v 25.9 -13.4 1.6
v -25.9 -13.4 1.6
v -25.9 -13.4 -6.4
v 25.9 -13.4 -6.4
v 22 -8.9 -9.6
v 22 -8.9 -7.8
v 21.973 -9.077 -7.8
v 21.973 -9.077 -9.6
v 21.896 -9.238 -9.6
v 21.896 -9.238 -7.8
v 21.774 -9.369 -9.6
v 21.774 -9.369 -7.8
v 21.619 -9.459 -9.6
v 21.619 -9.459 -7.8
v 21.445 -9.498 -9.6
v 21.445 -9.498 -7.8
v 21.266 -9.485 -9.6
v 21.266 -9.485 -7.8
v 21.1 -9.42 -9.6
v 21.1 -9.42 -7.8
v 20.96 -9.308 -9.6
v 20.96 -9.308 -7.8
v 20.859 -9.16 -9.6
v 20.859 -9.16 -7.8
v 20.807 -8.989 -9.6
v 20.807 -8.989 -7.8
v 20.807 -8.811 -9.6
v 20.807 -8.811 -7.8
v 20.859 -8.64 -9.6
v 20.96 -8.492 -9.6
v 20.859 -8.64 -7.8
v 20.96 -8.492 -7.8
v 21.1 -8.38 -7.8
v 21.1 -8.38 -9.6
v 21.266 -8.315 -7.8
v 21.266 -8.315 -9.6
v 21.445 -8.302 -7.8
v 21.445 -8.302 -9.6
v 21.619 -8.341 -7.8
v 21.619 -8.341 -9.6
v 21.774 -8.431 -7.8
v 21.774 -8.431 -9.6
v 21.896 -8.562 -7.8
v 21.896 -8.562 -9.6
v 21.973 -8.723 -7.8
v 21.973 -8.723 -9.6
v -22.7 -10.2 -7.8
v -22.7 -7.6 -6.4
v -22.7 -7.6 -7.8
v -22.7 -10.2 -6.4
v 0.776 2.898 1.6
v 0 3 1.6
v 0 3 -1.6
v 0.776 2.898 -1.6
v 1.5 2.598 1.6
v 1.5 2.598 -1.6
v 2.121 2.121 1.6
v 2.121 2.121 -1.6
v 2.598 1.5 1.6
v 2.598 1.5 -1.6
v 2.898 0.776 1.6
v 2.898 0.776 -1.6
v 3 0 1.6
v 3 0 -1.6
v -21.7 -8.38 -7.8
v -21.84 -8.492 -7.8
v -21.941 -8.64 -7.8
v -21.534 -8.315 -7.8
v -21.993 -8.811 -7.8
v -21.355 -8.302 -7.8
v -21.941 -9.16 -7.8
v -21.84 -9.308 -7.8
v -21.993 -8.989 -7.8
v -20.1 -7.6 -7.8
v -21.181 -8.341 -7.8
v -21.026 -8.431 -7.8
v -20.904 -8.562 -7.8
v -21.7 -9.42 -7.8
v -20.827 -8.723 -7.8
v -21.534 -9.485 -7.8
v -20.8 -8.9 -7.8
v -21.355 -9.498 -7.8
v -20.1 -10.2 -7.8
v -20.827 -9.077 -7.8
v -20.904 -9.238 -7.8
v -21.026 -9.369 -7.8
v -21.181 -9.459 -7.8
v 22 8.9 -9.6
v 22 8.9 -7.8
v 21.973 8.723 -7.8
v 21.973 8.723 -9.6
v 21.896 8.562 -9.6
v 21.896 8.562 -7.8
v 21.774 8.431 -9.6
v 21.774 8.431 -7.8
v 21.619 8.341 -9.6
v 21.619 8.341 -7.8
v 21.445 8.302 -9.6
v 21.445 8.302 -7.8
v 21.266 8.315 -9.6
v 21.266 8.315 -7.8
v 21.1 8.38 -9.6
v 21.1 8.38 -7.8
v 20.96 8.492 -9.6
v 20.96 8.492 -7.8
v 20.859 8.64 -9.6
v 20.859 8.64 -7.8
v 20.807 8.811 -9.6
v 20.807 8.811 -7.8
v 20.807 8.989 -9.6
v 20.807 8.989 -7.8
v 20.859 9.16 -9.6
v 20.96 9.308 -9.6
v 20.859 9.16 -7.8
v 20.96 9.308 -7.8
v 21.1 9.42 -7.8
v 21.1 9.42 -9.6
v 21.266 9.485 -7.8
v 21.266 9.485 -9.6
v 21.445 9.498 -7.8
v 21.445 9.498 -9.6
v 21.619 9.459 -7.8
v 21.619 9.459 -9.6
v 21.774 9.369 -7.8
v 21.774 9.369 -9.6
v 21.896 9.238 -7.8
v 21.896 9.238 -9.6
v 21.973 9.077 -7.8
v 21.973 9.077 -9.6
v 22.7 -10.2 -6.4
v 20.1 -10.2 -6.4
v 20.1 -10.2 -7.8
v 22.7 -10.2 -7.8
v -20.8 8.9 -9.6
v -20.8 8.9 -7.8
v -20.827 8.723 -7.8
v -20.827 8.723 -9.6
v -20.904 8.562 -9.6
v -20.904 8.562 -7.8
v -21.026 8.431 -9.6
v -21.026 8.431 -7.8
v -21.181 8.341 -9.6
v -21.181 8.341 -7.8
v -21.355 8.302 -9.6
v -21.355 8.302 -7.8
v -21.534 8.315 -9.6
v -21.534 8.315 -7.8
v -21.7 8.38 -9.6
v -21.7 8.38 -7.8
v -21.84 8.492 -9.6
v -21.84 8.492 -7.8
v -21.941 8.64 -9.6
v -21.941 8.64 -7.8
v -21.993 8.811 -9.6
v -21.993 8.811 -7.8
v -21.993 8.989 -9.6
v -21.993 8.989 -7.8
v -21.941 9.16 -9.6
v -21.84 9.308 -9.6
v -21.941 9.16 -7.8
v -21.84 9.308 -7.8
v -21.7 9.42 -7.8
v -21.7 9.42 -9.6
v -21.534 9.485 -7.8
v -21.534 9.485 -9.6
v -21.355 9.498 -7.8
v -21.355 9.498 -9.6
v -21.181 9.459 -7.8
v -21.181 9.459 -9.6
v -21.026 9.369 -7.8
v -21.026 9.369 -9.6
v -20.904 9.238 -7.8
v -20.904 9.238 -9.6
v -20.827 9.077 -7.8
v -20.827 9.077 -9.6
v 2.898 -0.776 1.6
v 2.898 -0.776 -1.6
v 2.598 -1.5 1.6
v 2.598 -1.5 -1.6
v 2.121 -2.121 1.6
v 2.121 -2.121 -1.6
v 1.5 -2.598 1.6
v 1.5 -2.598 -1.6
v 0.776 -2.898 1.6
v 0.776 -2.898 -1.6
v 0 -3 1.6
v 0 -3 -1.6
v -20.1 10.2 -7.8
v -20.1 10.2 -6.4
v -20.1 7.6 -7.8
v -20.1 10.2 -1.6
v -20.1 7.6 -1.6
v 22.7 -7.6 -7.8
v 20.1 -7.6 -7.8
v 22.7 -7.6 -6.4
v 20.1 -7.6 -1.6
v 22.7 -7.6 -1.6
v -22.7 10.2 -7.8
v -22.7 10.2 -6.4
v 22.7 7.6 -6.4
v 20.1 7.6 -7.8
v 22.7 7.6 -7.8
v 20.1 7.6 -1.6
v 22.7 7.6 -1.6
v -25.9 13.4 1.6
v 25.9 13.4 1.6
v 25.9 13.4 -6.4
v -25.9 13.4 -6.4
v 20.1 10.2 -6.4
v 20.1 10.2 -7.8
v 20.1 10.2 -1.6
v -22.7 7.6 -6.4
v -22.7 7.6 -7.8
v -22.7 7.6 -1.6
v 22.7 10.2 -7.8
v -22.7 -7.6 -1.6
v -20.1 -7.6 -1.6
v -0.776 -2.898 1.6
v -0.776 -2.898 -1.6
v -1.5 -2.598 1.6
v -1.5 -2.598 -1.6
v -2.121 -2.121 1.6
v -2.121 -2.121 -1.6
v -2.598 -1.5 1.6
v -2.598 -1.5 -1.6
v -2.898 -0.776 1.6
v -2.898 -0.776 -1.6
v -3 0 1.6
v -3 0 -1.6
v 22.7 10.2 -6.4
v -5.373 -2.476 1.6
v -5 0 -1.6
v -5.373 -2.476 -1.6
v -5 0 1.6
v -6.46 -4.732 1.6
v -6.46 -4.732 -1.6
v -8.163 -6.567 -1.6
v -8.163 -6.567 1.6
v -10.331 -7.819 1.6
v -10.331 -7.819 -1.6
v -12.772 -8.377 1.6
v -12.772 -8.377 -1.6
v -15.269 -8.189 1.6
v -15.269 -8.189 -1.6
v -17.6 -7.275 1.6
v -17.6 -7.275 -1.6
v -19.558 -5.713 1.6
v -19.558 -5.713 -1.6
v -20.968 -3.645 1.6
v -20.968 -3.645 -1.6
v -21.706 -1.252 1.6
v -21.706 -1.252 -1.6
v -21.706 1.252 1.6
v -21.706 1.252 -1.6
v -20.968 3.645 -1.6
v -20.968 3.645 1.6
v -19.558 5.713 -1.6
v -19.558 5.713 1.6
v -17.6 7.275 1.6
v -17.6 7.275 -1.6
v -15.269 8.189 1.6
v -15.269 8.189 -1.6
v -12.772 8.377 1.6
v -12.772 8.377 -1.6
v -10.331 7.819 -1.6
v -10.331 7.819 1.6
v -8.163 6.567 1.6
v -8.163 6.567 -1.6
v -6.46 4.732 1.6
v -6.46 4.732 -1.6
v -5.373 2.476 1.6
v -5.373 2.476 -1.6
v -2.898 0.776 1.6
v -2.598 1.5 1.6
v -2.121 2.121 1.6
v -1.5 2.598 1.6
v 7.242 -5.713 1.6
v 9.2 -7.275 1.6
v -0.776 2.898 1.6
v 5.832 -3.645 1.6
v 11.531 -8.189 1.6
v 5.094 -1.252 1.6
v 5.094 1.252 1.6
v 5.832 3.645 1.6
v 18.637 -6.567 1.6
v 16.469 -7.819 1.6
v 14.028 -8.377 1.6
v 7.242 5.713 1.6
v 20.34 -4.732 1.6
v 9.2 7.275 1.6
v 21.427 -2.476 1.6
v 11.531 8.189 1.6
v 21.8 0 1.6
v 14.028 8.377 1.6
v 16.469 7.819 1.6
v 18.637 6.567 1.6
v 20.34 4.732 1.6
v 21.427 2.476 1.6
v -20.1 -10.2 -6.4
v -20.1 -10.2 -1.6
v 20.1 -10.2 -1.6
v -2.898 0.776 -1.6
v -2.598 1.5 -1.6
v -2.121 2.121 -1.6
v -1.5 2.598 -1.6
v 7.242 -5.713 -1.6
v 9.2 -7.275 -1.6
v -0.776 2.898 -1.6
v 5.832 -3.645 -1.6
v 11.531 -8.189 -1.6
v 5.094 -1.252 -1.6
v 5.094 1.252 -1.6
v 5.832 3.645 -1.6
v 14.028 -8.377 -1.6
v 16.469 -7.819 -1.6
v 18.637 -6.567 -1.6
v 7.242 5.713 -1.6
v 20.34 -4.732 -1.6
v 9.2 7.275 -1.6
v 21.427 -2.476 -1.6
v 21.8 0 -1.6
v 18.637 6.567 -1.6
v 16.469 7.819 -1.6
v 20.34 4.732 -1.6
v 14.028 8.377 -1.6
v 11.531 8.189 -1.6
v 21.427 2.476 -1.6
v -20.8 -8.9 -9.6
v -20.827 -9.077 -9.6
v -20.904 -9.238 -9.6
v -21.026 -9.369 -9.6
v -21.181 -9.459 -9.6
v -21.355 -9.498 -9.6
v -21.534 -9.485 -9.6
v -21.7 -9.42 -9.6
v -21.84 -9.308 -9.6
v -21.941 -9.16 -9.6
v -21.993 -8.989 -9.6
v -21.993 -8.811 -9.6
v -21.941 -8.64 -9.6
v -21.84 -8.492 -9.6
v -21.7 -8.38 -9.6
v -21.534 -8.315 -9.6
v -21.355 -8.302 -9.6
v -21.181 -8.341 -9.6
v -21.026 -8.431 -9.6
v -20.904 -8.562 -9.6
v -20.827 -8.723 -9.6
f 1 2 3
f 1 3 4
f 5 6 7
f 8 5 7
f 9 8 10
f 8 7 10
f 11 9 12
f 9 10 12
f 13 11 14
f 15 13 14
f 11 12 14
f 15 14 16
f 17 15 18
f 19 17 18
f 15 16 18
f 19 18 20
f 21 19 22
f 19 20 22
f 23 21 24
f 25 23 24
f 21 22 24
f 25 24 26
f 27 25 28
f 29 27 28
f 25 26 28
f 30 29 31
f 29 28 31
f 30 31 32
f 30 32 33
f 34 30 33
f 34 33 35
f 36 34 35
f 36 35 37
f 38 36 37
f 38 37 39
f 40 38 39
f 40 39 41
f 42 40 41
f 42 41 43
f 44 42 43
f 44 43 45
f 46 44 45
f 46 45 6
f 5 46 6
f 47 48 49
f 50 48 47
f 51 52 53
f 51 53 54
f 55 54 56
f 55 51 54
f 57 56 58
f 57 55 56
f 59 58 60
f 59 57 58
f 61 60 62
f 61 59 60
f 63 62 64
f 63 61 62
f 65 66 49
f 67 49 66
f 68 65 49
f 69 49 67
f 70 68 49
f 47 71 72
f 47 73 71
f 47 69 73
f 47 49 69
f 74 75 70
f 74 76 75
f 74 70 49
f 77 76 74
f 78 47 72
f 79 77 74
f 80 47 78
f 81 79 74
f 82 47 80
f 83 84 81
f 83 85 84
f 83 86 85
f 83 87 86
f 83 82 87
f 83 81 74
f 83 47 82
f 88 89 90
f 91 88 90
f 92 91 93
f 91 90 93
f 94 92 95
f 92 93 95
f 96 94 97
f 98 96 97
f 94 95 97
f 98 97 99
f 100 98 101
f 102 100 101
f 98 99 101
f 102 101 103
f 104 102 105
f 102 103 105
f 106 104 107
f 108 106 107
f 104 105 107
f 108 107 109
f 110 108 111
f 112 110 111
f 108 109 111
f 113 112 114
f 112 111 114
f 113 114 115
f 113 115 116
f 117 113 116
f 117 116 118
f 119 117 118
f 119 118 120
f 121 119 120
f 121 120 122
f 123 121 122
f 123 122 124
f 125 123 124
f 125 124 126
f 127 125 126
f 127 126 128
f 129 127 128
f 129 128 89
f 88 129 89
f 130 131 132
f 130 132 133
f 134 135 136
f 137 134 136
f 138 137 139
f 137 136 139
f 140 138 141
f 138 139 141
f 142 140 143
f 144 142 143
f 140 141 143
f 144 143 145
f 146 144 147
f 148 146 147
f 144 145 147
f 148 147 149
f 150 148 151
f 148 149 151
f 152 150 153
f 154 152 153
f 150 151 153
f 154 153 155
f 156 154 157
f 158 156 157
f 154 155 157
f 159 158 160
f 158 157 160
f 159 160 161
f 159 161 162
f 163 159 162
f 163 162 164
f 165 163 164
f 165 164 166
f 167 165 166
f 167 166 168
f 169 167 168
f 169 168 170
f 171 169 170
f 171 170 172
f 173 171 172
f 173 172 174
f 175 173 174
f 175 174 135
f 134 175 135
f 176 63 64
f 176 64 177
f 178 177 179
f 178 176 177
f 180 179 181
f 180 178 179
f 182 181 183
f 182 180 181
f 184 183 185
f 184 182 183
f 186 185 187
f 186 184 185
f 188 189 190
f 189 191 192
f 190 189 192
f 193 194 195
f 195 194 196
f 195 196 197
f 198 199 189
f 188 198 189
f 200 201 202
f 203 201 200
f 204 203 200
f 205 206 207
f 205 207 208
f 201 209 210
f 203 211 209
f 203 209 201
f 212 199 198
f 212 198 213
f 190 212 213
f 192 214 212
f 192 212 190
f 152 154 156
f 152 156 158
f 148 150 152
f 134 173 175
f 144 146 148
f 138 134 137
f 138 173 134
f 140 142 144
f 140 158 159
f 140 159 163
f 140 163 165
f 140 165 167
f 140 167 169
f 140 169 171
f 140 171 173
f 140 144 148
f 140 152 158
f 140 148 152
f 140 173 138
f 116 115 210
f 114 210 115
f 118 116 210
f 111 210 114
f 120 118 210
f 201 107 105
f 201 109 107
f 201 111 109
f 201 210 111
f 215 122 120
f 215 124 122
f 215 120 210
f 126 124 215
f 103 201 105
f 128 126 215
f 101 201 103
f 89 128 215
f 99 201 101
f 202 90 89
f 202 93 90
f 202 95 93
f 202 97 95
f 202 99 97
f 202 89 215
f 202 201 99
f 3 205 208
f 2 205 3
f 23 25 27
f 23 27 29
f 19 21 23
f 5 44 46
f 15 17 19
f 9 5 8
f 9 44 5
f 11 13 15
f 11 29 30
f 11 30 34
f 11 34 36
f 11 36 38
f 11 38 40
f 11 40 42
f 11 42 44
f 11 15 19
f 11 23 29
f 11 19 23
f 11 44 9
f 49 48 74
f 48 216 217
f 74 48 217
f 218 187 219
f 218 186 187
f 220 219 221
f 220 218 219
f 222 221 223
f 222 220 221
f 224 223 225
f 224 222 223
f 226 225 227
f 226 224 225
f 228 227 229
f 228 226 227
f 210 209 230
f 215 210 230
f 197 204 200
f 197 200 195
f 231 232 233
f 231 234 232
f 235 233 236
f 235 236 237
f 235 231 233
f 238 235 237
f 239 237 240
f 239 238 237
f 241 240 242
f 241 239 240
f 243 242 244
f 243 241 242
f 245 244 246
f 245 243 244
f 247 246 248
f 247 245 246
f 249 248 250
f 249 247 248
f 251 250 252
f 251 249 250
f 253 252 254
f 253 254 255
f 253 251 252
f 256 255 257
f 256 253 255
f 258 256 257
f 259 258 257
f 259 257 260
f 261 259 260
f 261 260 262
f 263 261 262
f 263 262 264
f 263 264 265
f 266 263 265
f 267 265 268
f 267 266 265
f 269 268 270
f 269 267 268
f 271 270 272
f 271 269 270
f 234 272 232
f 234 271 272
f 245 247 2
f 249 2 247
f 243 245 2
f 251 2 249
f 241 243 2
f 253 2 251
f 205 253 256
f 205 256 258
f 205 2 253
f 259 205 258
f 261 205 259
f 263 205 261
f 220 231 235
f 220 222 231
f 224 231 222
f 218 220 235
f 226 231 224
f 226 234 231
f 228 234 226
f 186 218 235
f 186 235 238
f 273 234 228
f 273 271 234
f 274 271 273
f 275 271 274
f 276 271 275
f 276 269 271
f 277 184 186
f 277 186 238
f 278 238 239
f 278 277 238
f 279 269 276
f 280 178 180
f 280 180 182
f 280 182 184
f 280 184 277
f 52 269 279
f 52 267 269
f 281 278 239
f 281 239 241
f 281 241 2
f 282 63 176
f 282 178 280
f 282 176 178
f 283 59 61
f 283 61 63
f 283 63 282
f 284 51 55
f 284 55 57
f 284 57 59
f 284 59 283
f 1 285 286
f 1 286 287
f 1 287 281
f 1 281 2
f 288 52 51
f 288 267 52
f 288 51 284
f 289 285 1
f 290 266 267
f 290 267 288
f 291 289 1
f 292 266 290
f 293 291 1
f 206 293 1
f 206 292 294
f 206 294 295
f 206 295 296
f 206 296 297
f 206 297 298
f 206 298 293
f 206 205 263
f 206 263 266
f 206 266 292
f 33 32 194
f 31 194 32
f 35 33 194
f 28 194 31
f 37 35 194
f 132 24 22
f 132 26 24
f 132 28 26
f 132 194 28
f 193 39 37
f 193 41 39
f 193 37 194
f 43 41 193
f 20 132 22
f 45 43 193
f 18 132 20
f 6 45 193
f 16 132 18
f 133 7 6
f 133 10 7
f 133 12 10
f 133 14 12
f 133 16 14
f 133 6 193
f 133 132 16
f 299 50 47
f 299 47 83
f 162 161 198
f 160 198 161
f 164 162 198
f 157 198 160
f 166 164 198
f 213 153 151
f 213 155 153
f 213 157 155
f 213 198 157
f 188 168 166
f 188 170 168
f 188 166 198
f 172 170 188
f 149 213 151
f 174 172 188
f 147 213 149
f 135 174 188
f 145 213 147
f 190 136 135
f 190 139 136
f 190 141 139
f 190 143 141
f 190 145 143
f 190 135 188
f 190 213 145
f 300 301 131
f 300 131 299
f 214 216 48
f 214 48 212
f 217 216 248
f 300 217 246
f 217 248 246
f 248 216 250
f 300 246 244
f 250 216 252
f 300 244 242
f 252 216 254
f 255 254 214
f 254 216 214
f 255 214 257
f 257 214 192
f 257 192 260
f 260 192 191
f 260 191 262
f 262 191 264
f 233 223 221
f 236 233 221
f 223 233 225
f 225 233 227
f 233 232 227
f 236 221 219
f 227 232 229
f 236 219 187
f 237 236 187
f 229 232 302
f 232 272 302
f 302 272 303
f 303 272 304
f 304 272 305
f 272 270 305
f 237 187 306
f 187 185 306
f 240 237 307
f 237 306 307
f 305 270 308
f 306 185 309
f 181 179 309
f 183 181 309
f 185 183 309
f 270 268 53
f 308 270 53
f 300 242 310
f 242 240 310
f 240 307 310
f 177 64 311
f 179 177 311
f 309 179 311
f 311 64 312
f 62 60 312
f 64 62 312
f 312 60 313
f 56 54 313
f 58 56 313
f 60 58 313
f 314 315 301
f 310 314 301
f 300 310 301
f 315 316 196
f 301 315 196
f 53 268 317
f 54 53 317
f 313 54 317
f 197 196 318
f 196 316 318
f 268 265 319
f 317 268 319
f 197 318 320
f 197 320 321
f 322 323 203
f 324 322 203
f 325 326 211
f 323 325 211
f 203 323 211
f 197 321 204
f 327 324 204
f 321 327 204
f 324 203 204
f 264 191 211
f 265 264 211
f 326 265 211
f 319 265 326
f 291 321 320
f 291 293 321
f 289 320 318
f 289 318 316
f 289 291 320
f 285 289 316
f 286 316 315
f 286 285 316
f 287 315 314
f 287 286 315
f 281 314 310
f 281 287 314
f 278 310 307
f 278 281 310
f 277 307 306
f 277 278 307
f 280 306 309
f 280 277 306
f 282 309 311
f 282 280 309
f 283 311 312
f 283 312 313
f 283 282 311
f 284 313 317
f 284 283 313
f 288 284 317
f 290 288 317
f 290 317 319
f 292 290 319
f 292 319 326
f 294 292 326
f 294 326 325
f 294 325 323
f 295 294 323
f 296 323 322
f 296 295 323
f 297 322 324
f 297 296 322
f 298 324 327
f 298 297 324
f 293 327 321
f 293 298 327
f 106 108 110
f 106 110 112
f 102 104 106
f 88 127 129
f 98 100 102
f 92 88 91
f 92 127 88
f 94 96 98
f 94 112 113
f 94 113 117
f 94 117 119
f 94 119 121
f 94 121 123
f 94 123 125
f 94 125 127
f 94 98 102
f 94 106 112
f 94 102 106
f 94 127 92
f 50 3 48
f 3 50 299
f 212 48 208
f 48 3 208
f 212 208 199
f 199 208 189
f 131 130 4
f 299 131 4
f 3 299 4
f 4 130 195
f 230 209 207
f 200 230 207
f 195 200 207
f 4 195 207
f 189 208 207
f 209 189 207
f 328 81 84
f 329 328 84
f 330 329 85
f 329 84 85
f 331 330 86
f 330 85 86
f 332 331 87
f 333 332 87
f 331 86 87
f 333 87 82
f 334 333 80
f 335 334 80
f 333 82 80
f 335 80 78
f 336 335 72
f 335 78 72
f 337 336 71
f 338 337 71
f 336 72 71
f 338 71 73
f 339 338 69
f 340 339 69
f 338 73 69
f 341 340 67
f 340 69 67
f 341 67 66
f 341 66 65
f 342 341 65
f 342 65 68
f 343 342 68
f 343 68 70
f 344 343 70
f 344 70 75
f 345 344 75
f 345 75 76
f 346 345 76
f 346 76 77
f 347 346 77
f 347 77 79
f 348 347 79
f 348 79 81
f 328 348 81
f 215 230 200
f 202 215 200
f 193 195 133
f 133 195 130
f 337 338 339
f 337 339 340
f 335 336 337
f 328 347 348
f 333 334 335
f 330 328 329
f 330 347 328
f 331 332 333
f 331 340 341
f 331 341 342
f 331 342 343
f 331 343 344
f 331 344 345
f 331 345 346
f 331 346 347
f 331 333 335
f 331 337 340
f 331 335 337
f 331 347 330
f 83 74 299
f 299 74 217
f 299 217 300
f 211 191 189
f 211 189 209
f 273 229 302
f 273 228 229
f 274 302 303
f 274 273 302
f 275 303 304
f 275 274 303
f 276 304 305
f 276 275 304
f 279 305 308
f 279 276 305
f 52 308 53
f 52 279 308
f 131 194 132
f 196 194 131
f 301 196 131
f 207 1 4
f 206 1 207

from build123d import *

# Parameters (mm, degrees)
F1_DEPTH = 1.6
F3_DEPTH = 8
F4_R     = 0.6
F5_DEPTH = 8
F4_W     = 2.6
F4_H     = 2.6
F6_DEPTH = 6.2


with BuildPart() as f1:
    # F0 (on Top) → F1 (new body, symmetric)
    with BuildSketch(Plane.XY):
        with BuildLine():
            Line((-5, 0), (-3, 0))
            ThreePointArc((-3, 0), (-2.12132, 2.12132), (0, 3))
            Line((0, 3), (0, 10.2))
            Line((0, 10.2), (-22.7, 10.2))
            Line((-22.7, 10.2), (-22.7, 0))
            Line((-22.7, 0), (-21.8, 0))
            ThreePointArc((-21.8, 0), (-13.4, 8.4), (-5, 0))
        make_face()
        with BuildLine():
            ThreePointArc((0, -3), (-2.12132, -2.12132), (-3, 0))
            Line((-3, 0), (-5, 0))
            ThreePointArc((-5, 0), (-13.4, -8.4), (-21.8, 0))
            Line((-21.8, 0), (-22.7, 0))
            Line((-22.7, 0), (-22.7, -10.2))
            Line((-22.7, -10.2), (0, -10.2))
            Line((0, -10.2), (0, -3))
        make_face()
        with BuildLine():
            Line((0, 10.2), (0, 3))
            ThreePointArc((0, 3), (2.12132, 2.12132), (3, 0))
            Line((3, 0), (5, 0))
            ThreePointArc((5, 0), (13.4, 8.4), (21.8, 0))
            Line((21.8, 0), (22.7, 0))
            Line((22.7, 0), (22.7, 10.2))
            Line((22.7, 10.2), (0, 10.2))
        make_face()
        with BuildLine():
            ThreePointArc((3, 0), (2.12132, -2.12132), (0, -3))
            Line((0, -3), (0, -10.2))
            Line((0, -10.2), (22.7, -10.2))
            Line((22.7, -10.2), (22.7, 0))
            Line((22.7, 0), (21.8, 0))
            ThreePointArc((21.8, 0), (13.4, -8.4), (5, 0))
            Line((5, 0), (3, 0))
        make_face()
    extrude(amount=F1_DEPTH, both=True)

    # F2 (on face) → F3 (join)
    with BuildSketch(Plane.XY.offset(1.6)):
        Polygon((-22.7, 10.2), (0, 10.2), (0, 13.4), (-25.9, 13.4), (-25.9, -13.4), (0, -13.4), (0, -10.2), (-22.7, -10.2), align=None)
        Polygon((0, 10.2), (22.7, 10.2), (22.7, -10.2), (0, -10.2), (0, -13.4), (25.9, -13.4), (25.9, 13.4), (0, 13.4), align=None)
    extrude(amount=-F3_DEPTH)

    # F4 (on face) → F5 (join)
    with BuildSketch(Plane(origin=(0, 0, -1.6), x_dir=(1, 0, 0), z_dir=(0, 0, -1))):
        with Locations((-21.4, 8.9)):
            Circle(F4_R)
        with Locations((-21.4, -8.9)):
            Circle(F4_R)
        with Locations((21.4, -8.9)):
            Circle(F4_R)
        with Locations((21.4, 8.9)):
            Circle(F4_R)
    extrude(amount=F5_DEPTH)

    # F4 (on face) → F6 (join)
    with BuildSketch(Plane(origin=(0, 0, -1.6), x_dir=(1, 0, 0), z_dir=(0, 0, -1))):
        with Locations((-21.4, 8.9)):
            Rectangle(F4_W, F4_H)
        with Locations((-21.4, 8.9)):
            Circle(F4_R, mode=Mode.SUBTRACT)
        with Locations((-21.4, -8.9)):
            Rectangle(F4_W, F4_H)
        with Locations((-21.4, -8.9)):
            Circle(F4_R, mode=Mode.SUBTRACT)
        with Locations((21.4, 8.9)):
            Rectangle(F4_W, F4_H)
        with Locations((21.4, 8.9)):
            Circle(F4_R, mode=Mode.SUBTRACT)
        with Locations((21.4, -8.9)):
            Rectangle(F4_W, F4_H)
        with Locations((21.4, -8.9)):
            Circle(F4_R, mode=Mode.SUBTRACT)
    extrude(amount=F6_DEPTH)


solid = f1.part
